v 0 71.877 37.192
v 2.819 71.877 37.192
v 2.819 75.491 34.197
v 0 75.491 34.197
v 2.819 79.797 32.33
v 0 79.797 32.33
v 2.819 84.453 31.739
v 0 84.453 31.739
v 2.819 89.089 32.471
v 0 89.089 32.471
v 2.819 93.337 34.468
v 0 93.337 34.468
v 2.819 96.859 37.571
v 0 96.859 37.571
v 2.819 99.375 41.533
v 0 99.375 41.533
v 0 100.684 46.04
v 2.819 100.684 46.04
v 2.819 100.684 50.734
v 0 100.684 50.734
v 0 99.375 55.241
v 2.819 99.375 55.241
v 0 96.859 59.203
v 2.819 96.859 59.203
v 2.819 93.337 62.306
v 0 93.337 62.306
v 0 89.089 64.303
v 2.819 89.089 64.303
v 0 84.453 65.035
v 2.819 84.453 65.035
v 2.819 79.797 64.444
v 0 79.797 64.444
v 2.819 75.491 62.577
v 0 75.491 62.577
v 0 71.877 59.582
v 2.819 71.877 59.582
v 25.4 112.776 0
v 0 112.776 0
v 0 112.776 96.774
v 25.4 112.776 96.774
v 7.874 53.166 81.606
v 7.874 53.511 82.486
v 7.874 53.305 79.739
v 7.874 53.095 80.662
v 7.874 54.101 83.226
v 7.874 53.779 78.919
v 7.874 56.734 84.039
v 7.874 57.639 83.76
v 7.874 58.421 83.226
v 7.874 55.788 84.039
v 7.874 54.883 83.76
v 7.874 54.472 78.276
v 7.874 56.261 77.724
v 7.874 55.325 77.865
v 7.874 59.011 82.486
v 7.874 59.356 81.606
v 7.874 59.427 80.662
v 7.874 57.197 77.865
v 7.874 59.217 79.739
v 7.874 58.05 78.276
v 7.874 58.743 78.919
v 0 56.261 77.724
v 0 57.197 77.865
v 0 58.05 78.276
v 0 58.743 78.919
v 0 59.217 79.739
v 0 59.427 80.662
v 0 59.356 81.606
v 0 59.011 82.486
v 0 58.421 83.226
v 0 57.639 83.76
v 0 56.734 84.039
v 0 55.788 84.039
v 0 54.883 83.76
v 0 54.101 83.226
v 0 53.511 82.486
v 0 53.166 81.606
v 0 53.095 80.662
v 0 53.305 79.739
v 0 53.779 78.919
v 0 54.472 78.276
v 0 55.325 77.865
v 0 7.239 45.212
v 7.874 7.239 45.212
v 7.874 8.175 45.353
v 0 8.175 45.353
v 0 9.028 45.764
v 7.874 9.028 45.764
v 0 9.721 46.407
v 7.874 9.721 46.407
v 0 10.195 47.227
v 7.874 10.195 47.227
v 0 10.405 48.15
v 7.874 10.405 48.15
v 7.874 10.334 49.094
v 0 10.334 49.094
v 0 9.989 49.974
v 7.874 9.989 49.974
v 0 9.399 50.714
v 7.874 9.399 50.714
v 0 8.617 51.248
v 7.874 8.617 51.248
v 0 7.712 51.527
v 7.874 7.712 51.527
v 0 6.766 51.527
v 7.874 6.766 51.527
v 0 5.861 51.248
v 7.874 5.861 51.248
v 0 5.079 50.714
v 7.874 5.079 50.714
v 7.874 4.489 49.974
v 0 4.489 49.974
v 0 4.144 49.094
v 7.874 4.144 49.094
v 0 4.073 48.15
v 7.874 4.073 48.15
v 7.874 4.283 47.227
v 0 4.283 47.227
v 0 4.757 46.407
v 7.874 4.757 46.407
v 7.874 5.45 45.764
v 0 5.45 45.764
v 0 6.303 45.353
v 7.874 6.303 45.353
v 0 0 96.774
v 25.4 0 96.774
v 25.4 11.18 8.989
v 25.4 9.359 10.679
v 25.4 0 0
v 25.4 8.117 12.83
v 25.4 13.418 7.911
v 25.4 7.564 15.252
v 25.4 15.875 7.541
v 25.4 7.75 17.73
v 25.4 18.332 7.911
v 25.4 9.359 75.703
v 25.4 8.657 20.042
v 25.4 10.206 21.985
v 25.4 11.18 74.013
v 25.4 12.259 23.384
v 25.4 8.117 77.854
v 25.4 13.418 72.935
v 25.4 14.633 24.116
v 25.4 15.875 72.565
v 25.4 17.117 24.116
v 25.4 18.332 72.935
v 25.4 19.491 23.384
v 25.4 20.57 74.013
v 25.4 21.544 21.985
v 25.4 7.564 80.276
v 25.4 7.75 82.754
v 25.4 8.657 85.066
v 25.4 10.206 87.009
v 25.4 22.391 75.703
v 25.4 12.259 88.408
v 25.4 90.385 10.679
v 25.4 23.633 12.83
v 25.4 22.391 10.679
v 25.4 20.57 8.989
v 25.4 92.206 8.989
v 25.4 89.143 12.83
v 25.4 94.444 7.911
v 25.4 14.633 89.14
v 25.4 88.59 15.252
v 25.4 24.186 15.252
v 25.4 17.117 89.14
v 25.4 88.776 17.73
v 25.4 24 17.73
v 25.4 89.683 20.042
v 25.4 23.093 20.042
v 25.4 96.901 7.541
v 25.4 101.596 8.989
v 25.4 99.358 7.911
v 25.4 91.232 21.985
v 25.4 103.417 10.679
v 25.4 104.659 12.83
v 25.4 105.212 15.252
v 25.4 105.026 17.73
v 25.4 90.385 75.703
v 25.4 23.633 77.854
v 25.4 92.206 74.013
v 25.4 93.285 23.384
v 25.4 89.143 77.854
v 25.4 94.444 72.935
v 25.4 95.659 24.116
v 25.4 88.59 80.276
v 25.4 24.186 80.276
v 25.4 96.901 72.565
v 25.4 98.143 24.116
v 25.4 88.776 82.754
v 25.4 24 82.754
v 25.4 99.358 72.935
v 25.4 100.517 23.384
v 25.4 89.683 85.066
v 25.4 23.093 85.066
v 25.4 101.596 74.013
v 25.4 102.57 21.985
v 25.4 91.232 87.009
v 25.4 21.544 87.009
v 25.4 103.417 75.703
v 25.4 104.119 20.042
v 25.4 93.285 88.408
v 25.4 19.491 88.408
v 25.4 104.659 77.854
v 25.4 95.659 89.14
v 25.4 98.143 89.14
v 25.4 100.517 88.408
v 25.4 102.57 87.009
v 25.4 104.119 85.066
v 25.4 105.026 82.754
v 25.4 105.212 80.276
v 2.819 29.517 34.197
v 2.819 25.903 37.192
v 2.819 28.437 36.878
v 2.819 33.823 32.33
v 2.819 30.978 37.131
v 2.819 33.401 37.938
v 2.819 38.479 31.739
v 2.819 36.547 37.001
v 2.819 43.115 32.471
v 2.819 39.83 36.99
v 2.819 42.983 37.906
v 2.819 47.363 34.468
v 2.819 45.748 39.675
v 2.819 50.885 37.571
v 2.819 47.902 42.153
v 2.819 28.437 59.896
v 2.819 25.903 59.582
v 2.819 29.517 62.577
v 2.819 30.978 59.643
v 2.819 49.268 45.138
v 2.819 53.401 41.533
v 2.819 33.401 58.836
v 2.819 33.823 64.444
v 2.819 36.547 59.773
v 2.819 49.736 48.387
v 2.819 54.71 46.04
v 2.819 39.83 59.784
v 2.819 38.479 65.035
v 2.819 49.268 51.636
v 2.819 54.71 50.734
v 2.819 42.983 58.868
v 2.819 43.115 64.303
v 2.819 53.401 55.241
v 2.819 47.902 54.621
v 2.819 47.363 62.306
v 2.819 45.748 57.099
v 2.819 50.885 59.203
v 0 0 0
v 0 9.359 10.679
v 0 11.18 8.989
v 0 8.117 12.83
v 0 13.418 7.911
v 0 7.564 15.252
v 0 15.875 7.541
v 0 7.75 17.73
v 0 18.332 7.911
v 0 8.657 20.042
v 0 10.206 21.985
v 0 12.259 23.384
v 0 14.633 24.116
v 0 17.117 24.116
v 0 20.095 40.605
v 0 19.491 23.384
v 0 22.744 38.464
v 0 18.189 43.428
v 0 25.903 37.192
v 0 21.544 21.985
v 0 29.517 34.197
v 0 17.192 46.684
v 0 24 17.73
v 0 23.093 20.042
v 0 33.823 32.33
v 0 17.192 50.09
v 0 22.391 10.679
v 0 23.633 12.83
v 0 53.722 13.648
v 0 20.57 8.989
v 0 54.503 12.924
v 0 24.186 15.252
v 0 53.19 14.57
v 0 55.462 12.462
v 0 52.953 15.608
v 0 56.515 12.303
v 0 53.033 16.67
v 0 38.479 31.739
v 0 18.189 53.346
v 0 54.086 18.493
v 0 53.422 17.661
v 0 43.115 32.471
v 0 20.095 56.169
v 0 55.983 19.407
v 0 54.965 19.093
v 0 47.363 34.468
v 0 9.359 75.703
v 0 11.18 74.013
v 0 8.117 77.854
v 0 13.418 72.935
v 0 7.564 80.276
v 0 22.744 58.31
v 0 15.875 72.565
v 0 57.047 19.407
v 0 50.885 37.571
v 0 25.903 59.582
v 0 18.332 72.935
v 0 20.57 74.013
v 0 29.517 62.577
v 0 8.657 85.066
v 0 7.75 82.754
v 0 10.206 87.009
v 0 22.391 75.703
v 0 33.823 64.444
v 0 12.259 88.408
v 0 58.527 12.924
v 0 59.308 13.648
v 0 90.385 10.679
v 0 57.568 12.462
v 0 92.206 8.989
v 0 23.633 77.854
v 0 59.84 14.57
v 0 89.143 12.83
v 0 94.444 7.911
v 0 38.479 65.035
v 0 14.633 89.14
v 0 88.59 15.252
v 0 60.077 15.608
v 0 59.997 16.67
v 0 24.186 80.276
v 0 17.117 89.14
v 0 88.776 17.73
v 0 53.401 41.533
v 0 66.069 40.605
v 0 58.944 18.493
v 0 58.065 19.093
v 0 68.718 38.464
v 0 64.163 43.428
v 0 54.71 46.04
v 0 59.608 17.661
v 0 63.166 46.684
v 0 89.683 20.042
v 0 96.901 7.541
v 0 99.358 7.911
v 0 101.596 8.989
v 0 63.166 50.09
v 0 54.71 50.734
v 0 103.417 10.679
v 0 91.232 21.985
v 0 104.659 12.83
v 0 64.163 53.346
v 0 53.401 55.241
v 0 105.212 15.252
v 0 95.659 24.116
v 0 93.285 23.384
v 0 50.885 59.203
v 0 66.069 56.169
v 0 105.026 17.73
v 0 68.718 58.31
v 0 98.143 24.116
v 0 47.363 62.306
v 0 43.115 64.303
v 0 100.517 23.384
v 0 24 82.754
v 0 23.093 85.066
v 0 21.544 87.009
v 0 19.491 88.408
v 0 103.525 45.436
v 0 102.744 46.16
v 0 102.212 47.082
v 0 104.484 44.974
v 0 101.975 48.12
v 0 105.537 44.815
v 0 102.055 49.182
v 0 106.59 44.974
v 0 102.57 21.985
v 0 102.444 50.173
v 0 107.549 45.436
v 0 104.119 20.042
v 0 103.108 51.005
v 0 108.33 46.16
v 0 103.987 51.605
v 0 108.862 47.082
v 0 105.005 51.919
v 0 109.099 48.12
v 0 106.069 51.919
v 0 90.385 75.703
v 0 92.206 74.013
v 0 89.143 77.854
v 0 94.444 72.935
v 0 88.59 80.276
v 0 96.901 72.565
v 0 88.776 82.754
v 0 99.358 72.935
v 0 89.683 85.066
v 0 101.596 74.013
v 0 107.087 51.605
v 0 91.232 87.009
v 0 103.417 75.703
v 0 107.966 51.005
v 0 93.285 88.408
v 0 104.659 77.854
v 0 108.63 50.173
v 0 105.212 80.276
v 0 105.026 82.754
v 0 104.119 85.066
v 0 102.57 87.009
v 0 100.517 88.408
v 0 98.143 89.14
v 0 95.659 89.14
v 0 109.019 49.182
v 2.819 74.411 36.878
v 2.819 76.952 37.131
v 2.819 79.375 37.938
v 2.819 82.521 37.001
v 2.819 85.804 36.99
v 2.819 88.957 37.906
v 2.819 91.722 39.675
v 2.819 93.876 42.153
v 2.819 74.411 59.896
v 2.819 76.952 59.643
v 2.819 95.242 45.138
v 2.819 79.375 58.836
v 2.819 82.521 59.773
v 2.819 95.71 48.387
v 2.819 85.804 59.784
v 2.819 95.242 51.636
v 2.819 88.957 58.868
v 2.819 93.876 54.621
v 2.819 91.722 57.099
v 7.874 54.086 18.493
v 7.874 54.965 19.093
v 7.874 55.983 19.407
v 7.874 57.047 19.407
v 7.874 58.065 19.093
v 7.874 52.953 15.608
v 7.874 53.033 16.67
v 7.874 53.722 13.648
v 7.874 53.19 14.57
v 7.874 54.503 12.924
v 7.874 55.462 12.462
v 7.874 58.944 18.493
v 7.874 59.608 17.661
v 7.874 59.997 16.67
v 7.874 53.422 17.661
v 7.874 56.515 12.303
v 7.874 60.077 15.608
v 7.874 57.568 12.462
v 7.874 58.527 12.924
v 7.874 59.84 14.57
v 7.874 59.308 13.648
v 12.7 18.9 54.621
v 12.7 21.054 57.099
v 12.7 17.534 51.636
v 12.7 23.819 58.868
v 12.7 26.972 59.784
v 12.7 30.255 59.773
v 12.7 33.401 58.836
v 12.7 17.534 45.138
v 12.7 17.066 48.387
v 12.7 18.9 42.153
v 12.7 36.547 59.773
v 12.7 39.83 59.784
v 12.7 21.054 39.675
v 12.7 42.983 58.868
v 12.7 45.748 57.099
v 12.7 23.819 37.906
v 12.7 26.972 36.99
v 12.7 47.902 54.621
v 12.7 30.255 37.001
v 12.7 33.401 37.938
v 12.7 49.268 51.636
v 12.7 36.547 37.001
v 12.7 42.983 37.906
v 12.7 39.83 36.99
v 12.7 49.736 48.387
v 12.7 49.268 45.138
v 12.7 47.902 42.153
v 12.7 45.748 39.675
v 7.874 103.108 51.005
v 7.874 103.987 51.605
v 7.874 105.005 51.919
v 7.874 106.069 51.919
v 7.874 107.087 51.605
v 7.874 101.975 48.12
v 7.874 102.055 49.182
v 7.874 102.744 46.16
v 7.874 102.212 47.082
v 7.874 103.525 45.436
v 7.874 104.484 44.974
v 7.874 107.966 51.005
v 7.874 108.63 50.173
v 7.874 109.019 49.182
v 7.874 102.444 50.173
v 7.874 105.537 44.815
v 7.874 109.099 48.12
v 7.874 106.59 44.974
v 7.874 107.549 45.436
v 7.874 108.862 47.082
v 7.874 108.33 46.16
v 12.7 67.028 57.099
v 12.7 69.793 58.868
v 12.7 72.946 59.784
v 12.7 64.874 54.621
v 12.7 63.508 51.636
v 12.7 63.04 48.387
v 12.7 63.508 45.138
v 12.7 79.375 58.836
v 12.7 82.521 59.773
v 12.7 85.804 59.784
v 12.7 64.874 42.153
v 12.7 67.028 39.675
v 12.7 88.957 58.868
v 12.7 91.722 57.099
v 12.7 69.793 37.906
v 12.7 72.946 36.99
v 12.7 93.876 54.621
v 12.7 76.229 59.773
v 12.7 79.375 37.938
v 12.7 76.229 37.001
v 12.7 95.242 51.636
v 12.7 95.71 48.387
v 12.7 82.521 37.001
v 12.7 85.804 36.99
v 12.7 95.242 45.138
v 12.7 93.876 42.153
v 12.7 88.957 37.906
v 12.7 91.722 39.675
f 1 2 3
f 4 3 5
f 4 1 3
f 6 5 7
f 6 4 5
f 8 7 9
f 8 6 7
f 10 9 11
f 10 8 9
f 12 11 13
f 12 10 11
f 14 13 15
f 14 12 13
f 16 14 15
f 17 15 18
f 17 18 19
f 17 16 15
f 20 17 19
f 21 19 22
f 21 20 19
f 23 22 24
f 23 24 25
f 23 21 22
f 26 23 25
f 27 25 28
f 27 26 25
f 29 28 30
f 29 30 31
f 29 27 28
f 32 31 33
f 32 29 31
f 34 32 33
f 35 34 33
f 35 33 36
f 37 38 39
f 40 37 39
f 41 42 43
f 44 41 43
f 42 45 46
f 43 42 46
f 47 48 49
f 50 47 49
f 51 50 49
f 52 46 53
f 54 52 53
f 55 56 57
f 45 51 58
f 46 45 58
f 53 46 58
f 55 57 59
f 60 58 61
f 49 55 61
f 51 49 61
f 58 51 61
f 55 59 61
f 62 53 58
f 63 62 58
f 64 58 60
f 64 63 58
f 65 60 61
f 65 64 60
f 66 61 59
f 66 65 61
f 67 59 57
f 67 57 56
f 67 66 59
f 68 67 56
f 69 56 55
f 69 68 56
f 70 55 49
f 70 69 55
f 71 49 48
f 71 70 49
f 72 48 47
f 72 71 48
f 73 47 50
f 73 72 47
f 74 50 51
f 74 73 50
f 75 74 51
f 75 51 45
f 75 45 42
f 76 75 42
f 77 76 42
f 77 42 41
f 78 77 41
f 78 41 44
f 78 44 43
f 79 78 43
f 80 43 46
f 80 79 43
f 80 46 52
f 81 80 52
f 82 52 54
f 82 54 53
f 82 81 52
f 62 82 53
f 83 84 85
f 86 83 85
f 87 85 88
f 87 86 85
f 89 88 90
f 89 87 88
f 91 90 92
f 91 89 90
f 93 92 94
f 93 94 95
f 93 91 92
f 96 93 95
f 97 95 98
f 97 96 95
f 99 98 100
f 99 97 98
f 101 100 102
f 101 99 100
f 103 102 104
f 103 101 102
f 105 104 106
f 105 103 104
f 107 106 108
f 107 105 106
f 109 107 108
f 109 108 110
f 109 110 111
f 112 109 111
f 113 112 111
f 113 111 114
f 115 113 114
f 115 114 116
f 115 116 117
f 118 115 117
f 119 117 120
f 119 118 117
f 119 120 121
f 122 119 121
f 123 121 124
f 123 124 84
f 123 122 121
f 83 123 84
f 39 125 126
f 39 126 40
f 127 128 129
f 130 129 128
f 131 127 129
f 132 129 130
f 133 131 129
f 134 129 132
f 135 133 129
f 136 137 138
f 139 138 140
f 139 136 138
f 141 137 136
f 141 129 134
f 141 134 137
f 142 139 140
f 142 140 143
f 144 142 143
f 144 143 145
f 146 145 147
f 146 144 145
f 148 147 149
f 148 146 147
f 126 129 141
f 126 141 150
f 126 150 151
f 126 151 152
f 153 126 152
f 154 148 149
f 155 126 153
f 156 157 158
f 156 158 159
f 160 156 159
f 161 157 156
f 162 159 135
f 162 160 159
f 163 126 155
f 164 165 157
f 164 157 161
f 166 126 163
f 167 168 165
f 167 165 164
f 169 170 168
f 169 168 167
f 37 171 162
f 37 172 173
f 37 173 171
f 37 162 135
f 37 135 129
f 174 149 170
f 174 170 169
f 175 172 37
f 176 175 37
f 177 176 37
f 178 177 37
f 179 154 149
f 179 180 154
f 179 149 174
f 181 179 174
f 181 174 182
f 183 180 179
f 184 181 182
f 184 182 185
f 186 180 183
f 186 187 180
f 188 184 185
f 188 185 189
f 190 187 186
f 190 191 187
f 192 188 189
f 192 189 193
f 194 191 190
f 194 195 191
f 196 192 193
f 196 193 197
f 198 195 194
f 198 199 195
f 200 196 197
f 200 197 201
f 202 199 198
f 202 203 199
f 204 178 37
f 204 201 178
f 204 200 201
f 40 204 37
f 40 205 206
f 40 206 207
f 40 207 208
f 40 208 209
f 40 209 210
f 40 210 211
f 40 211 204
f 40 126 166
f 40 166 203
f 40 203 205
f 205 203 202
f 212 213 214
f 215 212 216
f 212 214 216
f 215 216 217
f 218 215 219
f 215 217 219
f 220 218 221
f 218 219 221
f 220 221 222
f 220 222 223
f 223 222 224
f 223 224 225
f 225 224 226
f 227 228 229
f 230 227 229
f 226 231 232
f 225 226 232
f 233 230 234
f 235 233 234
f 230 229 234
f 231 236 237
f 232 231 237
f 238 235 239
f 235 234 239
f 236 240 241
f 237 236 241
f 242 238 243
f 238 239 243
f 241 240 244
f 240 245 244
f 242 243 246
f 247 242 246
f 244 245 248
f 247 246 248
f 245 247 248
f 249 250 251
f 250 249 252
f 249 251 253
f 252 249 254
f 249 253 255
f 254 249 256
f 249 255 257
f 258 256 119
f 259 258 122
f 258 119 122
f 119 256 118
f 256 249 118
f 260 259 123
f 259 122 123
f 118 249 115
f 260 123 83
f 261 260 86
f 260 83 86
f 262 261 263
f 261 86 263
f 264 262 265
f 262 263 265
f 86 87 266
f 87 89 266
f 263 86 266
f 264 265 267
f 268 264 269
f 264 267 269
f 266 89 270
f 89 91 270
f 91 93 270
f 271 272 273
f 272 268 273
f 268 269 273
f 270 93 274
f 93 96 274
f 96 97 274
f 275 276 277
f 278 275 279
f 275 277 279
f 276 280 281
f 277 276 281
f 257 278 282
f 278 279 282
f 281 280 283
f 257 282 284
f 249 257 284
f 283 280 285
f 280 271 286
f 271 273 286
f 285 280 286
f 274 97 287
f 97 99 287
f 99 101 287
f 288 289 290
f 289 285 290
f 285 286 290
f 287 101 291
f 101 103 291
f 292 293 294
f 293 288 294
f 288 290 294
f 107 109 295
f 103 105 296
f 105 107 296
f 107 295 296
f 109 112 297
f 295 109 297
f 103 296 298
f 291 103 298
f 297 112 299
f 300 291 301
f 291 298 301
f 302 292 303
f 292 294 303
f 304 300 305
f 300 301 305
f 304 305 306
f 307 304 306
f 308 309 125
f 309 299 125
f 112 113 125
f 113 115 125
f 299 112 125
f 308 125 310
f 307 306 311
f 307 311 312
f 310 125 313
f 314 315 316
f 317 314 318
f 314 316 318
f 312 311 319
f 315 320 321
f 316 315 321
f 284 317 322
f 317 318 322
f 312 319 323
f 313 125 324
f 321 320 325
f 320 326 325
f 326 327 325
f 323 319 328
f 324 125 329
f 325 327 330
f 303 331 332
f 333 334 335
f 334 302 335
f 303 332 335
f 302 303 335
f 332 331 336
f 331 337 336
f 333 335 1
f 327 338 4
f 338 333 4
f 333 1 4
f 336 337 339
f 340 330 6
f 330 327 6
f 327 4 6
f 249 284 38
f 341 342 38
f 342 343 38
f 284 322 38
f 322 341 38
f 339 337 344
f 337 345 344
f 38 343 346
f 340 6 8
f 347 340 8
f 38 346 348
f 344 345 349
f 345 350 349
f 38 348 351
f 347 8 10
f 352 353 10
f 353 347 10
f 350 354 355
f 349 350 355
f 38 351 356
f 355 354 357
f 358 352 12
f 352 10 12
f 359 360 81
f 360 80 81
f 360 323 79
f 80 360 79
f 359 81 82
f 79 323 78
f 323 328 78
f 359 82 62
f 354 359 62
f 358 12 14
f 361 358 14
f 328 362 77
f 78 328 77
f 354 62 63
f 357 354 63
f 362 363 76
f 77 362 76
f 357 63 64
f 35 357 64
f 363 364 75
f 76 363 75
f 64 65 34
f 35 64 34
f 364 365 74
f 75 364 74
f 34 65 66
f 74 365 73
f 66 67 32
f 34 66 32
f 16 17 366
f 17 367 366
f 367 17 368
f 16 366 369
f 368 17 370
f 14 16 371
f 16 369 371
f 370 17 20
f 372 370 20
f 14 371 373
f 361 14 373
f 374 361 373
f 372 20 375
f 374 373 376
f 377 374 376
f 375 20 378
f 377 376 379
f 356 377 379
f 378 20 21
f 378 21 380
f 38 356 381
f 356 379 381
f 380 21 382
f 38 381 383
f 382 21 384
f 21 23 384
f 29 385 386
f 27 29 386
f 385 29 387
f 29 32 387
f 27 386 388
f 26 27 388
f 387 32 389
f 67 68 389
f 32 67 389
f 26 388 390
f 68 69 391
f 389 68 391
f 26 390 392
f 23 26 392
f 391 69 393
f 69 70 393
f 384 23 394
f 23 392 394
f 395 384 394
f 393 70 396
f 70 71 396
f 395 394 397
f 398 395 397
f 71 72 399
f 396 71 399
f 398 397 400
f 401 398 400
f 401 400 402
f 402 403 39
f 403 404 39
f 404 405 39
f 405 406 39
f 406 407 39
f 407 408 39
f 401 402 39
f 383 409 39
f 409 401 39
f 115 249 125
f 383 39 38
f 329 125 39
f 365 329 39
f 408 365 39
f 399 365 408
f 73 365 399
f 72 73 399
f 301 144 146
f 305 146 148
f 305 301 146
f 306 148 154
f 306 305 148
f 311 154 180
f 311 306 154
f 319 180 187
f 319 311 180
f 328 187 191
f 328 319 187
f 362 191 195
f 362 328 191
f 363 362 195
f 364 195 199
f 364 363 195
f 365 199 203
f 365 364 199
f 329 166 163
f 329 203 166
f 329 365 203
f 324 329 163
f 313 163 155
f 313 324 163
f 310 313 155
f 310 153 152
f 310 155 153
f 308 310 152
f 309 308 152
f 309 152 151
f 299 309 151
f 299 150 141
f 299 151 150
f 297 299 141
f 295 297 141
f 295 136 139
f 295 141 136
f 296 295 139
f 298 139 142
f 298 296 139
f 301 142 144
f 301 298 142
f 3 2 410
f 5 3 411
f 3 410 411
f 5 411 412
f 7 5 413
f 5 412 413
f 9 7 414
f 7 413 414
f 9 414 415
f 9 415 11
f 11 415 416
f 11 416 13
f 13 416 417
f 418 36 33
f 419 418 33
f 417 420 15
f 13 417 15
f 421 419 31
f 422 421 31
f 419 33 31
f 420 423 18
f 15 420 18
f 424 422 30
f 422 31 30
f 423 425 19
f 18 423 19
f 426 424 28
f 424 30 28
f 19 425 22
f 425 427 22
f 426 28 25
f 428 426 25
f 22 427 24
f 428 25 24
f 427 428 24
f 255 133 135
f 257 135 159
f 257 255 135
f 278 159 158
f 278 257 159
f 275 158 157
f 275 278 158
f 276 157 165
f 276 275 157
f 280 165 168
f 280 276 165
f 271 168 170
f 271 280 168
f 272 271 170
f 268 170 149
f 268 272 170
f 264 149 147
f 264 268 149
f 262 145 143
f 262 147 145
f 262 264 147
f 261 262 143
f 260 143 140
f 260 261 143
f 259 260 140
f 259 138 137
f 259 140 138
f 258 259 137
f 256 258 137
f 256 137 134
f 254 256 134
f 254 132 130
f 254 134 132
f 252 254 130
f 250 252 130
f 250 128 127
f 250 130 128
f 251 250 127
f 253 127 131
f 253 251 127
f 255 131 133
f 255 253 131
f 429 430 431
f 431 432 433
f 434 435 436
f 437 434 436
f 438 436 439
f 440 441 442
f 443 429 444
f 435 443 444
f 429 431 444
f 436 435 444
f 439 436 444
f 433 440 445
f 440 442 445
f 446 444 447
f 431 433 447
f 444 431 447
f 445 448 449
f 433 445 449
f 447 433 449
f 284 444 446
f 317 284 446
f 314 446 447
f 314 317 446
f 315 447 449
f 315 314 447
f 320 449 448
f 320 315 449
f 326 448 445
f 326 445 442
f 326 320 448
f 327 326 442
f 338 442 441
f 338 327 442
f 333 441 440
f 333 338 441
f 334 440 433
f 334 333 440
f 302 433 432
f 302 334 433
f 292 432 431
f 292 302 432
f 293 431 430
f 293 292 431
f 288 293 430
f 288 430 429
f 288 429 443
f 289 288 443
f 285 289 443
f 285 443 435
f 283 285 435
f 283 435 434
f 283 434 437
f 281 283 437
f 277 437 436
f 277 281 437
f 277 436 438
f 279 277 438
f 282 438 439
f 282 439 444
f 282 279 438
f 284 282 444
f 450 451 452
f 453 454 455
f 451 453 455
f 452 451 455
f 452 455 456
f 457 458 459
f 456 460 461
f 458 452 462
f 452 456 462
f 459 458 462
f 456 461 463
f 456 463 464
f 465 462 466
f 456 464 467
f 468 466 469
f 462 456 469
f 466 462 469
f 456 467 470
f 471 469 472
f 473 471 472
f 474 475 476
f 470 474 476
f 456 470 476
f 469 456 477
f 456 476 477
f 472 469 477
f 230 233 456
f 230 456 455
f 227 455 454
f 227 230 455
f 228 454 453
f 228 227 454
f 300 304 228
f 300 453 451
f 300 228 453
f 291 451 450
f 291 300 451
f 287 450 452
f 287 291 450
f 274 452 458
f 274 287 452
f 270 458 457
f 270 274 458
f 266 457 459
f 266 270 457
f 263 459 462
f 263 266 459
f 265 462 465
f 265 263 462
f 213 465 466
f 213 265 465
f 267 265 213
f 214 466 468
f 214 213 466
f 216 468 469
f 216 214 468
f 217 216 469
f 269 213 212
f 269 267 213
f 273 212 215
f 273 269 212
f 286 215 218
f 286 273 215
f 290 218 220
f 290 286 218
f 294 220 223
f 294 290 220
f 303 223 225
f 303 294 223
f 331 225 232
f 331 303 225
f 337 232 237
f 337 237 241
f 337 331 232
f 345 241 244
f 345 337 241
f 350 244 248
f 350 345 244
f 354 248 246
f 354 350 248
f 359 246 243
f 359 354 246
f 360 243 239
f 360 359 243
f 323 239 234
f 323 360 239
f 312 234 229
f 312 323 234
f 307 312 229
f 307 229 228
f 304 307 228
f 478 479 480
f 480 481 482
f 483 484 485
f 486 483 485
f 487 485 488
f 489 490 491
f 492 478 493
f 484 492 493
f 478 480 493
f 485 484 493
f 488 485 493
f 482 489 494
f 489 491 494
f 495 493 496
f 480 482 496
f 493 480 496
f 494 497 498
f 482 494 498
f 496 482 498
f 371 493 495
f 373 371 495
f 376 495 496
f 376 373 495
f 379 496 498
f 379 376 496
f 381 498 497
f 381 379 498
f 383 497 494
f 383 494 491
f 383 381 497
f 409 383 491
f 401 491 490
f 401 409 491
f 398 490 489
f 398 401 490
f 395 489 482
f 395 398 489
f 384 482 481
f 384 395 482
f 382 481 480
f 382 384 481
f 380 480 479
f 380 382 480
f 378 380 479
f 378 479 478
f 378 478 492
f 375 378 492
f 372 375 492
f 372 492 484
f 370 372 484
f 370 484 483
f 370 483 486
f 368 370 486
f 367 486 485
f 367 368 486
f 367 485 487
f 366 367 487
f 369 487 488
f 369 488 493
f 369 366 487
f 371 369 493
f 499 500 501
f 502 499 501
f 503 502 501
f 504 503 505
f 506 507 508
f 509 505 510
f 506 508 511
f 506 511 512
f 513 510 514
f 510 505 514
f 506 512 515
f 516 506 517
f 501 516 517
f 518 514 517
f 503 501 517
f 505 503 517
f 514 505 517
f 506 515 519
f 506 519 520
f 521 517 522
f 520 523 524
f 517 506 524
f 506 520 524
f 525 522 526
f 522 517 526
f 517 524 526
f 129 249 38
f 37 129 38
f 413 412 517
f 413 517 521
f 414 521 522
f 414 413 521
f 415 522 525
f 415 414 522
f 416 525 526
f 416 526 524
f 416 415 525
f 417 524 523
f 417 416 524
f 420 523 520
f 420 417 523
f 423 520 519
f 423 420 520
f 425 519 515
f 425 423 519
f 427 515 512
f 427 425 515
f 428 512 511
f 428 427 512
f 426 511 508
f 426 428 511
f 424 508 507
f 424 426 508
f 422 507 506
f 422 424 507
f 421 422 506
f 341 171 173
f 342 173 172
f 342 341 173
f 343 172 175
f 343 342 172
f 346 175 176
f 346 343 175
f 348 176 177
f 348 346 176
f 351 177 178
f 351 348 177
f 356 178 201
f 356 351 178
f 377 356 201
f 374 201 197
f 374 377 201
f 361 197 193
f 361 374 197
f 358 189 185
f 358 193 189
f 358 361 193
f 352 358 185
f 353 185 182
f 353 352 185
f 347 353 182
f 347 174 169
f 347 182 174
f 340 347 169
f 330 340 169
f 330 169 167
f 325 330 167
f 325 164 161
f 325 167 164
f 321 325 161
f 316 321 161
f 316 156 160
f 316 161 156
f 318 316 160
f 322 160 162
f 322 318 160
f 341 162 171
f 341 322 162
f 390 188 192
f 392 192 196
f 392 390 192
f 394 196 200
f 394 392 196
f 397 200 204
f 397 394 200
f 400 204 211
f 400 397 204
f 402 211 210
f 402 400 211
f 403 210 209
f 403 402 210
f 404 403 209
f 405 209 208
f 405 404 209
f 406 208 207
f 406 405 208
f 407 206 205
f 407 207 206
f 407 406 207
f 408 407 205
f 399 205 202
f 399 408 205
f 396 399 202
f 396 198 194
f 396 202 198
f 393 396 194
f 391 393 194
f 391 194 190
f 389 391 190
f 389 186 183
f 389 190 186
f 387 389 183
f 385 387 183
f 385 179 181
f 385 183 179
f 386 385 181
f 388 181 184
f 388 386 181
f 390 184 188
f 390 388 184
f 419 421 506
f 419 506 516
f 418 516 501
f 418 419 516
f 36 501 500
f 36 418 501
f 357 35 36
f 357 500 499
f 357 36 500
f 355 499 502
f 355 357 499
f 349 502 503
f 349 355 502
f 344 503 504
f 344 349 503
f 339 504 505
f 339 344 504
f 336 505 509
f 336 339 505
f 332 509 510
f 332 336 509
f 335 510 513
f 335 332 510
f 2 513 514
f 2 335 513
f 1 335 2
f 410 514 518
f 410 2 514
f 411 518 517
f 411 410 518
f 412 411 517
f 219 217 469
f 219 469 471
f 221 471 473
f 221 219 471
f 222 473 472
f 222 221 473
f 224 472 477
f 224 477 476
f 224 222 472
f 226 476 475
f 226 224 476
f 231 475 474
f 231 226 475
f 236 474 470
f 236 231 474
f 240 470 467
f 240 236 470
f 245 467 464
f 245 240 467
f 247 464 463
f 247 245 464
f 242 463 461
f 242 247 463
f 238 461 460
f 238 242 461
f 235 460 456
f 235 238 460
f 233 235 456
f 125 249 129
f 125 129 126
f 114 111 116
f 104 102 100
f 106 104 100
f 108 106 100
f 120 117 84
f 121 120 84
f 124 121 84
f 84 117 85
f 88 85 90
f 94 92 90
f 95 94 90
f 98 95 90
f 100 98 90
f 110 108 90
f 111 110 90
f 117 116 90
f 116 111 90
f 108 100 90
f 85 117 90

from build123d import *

# Parameters (mm, degrees)
SKETCH1_W           = 112.776
SKETCH1_H           = 96.774
BOSS_EXTRUDE1_DEPTH = 25.4
SKETCH2_R           = 8.334375
CUT_EXTRUDE2_DEPTH  = 151.760715215
SKETCH3_R           = 11.509375
CUT_EXTRUDE3_DEPTH  = 12.7
SKETCH4_R           = 11.509375
CUT_EXTRUDE4_DEPTH  = 12.7
SKETCH5_R           = 16.6497
CUT_EXTRUDE5_DEPTH  = 2.8194
SKETCH6_R           = 3.571875
CUT_EXTRUDE6_DEPTH  = 7.874
SKETCH8_R           = 3.175
CUT_EXTRUDE9_DEPTH  = 7.874


with BuildPart() as part:
    # Sketch1 → Boss-Extrude1 (new body)
    with BuildSketch(Plane.YZ):
        with Locations((56.388, 48.387)):
            Rectangle(SKETCH1_W, SKETCH1_H)
    extrude(amount=BOSS_EXTRUDE1_DEPTH)

    # Sketch2 → Cut-Extrude2 (cut, through all)
    with BuildSketch(Plane.YZ):
        with Locations(Location((15.875, 15.875, 0), (0, 0, 270))):
            Circle(SKETCH2_R)
        with Locations(Location((96.901, 15.875, 0), (0, 0, 270))):
            Circle(SKETCH2_R)
        with Locations(Location((15.875, 80.899, 0), (0, 0, 270))):
            Circle(SKETCH2_R)
        with Locations(Location((96.901, 80.899, 0), (0, 0, 270))):
            Circle(SKETCH2_R)
    extrude(amount=CUT_EXTRUDE2_DEPTH, mode=Mode.SUBTRACT)

    # Sketch3 → Cut-Extrude3 (cut)
    with BuildSketch(Plane.YZ):
        with Locations(Location((28.575, 48.387, 0), (0, 0, 270))):
            Circle(SKETCH3_R)
        with Locations(Location((74.549, 48.387, 0), (0, 0, 270))):
            Circle(SKETCH3_R)
    extrude(amount=CUT_EXTRUDE3_DEPTH, mode=Mode.SUBTRACT)

    # Sketch4 → Cut-Extrude4 (cut)
    with BuildSketch(Plane.YZ):
        with Locations((38.227, 48.387)):
            Circle(SKETCH4_R)
        with Locations((84.201, 48.387)):
            Circle(SKETCH4_R)
    extrude(amount=CUT_EXTRUDE4_DEPTH, mode=Mode.SUBTRACT)

    # Sketch5 → Cut-Extrude5 (cut)
    with BuildSketch(Plane.YZ):
        with Locations((38.227, 48.387)):
            Circle(SKETCH5_R)
        with Locations((84.201, 48.387)):
            Circle(SKETCH5_R)
    extrude(amount=CUT_EXTRUDE5_DEPTH, mode=Mode.SUBTRACT)

    # Sketch6 → Cut-Extrude6 (cut)
    with BuildSketch(Plane.YZ):
        with Locations(Location((105.537, 48.387, 0), (0, 0, 270))):
            Circle(SKETCH6_R)
        with Locations(Location((56.515, 15.875, 0), (0, 0, 270))):
            Circle(SKETCH6_R)
    extrude(amount=CUT_EXTRUDE6_DEPTH, mode=Mode.SUBTRACT)

    # Sketch8 → Cut-Extrude9 (cut)
    with BuildSketch(Plane.YZ):
        with Locations(Location((7.239, 48.387, 0), (0, 0, 270))):
            Circle(SKETCH8_R)
        with Locations(Location((56.261, 80.899, 0), (0, 0, 270))):
            Circle(SKETCH8_R)
    extrude(amount=CUT_EXTRUDE9_DEPTH, mode=Mode.SUBTRACT)


solid = part.part
